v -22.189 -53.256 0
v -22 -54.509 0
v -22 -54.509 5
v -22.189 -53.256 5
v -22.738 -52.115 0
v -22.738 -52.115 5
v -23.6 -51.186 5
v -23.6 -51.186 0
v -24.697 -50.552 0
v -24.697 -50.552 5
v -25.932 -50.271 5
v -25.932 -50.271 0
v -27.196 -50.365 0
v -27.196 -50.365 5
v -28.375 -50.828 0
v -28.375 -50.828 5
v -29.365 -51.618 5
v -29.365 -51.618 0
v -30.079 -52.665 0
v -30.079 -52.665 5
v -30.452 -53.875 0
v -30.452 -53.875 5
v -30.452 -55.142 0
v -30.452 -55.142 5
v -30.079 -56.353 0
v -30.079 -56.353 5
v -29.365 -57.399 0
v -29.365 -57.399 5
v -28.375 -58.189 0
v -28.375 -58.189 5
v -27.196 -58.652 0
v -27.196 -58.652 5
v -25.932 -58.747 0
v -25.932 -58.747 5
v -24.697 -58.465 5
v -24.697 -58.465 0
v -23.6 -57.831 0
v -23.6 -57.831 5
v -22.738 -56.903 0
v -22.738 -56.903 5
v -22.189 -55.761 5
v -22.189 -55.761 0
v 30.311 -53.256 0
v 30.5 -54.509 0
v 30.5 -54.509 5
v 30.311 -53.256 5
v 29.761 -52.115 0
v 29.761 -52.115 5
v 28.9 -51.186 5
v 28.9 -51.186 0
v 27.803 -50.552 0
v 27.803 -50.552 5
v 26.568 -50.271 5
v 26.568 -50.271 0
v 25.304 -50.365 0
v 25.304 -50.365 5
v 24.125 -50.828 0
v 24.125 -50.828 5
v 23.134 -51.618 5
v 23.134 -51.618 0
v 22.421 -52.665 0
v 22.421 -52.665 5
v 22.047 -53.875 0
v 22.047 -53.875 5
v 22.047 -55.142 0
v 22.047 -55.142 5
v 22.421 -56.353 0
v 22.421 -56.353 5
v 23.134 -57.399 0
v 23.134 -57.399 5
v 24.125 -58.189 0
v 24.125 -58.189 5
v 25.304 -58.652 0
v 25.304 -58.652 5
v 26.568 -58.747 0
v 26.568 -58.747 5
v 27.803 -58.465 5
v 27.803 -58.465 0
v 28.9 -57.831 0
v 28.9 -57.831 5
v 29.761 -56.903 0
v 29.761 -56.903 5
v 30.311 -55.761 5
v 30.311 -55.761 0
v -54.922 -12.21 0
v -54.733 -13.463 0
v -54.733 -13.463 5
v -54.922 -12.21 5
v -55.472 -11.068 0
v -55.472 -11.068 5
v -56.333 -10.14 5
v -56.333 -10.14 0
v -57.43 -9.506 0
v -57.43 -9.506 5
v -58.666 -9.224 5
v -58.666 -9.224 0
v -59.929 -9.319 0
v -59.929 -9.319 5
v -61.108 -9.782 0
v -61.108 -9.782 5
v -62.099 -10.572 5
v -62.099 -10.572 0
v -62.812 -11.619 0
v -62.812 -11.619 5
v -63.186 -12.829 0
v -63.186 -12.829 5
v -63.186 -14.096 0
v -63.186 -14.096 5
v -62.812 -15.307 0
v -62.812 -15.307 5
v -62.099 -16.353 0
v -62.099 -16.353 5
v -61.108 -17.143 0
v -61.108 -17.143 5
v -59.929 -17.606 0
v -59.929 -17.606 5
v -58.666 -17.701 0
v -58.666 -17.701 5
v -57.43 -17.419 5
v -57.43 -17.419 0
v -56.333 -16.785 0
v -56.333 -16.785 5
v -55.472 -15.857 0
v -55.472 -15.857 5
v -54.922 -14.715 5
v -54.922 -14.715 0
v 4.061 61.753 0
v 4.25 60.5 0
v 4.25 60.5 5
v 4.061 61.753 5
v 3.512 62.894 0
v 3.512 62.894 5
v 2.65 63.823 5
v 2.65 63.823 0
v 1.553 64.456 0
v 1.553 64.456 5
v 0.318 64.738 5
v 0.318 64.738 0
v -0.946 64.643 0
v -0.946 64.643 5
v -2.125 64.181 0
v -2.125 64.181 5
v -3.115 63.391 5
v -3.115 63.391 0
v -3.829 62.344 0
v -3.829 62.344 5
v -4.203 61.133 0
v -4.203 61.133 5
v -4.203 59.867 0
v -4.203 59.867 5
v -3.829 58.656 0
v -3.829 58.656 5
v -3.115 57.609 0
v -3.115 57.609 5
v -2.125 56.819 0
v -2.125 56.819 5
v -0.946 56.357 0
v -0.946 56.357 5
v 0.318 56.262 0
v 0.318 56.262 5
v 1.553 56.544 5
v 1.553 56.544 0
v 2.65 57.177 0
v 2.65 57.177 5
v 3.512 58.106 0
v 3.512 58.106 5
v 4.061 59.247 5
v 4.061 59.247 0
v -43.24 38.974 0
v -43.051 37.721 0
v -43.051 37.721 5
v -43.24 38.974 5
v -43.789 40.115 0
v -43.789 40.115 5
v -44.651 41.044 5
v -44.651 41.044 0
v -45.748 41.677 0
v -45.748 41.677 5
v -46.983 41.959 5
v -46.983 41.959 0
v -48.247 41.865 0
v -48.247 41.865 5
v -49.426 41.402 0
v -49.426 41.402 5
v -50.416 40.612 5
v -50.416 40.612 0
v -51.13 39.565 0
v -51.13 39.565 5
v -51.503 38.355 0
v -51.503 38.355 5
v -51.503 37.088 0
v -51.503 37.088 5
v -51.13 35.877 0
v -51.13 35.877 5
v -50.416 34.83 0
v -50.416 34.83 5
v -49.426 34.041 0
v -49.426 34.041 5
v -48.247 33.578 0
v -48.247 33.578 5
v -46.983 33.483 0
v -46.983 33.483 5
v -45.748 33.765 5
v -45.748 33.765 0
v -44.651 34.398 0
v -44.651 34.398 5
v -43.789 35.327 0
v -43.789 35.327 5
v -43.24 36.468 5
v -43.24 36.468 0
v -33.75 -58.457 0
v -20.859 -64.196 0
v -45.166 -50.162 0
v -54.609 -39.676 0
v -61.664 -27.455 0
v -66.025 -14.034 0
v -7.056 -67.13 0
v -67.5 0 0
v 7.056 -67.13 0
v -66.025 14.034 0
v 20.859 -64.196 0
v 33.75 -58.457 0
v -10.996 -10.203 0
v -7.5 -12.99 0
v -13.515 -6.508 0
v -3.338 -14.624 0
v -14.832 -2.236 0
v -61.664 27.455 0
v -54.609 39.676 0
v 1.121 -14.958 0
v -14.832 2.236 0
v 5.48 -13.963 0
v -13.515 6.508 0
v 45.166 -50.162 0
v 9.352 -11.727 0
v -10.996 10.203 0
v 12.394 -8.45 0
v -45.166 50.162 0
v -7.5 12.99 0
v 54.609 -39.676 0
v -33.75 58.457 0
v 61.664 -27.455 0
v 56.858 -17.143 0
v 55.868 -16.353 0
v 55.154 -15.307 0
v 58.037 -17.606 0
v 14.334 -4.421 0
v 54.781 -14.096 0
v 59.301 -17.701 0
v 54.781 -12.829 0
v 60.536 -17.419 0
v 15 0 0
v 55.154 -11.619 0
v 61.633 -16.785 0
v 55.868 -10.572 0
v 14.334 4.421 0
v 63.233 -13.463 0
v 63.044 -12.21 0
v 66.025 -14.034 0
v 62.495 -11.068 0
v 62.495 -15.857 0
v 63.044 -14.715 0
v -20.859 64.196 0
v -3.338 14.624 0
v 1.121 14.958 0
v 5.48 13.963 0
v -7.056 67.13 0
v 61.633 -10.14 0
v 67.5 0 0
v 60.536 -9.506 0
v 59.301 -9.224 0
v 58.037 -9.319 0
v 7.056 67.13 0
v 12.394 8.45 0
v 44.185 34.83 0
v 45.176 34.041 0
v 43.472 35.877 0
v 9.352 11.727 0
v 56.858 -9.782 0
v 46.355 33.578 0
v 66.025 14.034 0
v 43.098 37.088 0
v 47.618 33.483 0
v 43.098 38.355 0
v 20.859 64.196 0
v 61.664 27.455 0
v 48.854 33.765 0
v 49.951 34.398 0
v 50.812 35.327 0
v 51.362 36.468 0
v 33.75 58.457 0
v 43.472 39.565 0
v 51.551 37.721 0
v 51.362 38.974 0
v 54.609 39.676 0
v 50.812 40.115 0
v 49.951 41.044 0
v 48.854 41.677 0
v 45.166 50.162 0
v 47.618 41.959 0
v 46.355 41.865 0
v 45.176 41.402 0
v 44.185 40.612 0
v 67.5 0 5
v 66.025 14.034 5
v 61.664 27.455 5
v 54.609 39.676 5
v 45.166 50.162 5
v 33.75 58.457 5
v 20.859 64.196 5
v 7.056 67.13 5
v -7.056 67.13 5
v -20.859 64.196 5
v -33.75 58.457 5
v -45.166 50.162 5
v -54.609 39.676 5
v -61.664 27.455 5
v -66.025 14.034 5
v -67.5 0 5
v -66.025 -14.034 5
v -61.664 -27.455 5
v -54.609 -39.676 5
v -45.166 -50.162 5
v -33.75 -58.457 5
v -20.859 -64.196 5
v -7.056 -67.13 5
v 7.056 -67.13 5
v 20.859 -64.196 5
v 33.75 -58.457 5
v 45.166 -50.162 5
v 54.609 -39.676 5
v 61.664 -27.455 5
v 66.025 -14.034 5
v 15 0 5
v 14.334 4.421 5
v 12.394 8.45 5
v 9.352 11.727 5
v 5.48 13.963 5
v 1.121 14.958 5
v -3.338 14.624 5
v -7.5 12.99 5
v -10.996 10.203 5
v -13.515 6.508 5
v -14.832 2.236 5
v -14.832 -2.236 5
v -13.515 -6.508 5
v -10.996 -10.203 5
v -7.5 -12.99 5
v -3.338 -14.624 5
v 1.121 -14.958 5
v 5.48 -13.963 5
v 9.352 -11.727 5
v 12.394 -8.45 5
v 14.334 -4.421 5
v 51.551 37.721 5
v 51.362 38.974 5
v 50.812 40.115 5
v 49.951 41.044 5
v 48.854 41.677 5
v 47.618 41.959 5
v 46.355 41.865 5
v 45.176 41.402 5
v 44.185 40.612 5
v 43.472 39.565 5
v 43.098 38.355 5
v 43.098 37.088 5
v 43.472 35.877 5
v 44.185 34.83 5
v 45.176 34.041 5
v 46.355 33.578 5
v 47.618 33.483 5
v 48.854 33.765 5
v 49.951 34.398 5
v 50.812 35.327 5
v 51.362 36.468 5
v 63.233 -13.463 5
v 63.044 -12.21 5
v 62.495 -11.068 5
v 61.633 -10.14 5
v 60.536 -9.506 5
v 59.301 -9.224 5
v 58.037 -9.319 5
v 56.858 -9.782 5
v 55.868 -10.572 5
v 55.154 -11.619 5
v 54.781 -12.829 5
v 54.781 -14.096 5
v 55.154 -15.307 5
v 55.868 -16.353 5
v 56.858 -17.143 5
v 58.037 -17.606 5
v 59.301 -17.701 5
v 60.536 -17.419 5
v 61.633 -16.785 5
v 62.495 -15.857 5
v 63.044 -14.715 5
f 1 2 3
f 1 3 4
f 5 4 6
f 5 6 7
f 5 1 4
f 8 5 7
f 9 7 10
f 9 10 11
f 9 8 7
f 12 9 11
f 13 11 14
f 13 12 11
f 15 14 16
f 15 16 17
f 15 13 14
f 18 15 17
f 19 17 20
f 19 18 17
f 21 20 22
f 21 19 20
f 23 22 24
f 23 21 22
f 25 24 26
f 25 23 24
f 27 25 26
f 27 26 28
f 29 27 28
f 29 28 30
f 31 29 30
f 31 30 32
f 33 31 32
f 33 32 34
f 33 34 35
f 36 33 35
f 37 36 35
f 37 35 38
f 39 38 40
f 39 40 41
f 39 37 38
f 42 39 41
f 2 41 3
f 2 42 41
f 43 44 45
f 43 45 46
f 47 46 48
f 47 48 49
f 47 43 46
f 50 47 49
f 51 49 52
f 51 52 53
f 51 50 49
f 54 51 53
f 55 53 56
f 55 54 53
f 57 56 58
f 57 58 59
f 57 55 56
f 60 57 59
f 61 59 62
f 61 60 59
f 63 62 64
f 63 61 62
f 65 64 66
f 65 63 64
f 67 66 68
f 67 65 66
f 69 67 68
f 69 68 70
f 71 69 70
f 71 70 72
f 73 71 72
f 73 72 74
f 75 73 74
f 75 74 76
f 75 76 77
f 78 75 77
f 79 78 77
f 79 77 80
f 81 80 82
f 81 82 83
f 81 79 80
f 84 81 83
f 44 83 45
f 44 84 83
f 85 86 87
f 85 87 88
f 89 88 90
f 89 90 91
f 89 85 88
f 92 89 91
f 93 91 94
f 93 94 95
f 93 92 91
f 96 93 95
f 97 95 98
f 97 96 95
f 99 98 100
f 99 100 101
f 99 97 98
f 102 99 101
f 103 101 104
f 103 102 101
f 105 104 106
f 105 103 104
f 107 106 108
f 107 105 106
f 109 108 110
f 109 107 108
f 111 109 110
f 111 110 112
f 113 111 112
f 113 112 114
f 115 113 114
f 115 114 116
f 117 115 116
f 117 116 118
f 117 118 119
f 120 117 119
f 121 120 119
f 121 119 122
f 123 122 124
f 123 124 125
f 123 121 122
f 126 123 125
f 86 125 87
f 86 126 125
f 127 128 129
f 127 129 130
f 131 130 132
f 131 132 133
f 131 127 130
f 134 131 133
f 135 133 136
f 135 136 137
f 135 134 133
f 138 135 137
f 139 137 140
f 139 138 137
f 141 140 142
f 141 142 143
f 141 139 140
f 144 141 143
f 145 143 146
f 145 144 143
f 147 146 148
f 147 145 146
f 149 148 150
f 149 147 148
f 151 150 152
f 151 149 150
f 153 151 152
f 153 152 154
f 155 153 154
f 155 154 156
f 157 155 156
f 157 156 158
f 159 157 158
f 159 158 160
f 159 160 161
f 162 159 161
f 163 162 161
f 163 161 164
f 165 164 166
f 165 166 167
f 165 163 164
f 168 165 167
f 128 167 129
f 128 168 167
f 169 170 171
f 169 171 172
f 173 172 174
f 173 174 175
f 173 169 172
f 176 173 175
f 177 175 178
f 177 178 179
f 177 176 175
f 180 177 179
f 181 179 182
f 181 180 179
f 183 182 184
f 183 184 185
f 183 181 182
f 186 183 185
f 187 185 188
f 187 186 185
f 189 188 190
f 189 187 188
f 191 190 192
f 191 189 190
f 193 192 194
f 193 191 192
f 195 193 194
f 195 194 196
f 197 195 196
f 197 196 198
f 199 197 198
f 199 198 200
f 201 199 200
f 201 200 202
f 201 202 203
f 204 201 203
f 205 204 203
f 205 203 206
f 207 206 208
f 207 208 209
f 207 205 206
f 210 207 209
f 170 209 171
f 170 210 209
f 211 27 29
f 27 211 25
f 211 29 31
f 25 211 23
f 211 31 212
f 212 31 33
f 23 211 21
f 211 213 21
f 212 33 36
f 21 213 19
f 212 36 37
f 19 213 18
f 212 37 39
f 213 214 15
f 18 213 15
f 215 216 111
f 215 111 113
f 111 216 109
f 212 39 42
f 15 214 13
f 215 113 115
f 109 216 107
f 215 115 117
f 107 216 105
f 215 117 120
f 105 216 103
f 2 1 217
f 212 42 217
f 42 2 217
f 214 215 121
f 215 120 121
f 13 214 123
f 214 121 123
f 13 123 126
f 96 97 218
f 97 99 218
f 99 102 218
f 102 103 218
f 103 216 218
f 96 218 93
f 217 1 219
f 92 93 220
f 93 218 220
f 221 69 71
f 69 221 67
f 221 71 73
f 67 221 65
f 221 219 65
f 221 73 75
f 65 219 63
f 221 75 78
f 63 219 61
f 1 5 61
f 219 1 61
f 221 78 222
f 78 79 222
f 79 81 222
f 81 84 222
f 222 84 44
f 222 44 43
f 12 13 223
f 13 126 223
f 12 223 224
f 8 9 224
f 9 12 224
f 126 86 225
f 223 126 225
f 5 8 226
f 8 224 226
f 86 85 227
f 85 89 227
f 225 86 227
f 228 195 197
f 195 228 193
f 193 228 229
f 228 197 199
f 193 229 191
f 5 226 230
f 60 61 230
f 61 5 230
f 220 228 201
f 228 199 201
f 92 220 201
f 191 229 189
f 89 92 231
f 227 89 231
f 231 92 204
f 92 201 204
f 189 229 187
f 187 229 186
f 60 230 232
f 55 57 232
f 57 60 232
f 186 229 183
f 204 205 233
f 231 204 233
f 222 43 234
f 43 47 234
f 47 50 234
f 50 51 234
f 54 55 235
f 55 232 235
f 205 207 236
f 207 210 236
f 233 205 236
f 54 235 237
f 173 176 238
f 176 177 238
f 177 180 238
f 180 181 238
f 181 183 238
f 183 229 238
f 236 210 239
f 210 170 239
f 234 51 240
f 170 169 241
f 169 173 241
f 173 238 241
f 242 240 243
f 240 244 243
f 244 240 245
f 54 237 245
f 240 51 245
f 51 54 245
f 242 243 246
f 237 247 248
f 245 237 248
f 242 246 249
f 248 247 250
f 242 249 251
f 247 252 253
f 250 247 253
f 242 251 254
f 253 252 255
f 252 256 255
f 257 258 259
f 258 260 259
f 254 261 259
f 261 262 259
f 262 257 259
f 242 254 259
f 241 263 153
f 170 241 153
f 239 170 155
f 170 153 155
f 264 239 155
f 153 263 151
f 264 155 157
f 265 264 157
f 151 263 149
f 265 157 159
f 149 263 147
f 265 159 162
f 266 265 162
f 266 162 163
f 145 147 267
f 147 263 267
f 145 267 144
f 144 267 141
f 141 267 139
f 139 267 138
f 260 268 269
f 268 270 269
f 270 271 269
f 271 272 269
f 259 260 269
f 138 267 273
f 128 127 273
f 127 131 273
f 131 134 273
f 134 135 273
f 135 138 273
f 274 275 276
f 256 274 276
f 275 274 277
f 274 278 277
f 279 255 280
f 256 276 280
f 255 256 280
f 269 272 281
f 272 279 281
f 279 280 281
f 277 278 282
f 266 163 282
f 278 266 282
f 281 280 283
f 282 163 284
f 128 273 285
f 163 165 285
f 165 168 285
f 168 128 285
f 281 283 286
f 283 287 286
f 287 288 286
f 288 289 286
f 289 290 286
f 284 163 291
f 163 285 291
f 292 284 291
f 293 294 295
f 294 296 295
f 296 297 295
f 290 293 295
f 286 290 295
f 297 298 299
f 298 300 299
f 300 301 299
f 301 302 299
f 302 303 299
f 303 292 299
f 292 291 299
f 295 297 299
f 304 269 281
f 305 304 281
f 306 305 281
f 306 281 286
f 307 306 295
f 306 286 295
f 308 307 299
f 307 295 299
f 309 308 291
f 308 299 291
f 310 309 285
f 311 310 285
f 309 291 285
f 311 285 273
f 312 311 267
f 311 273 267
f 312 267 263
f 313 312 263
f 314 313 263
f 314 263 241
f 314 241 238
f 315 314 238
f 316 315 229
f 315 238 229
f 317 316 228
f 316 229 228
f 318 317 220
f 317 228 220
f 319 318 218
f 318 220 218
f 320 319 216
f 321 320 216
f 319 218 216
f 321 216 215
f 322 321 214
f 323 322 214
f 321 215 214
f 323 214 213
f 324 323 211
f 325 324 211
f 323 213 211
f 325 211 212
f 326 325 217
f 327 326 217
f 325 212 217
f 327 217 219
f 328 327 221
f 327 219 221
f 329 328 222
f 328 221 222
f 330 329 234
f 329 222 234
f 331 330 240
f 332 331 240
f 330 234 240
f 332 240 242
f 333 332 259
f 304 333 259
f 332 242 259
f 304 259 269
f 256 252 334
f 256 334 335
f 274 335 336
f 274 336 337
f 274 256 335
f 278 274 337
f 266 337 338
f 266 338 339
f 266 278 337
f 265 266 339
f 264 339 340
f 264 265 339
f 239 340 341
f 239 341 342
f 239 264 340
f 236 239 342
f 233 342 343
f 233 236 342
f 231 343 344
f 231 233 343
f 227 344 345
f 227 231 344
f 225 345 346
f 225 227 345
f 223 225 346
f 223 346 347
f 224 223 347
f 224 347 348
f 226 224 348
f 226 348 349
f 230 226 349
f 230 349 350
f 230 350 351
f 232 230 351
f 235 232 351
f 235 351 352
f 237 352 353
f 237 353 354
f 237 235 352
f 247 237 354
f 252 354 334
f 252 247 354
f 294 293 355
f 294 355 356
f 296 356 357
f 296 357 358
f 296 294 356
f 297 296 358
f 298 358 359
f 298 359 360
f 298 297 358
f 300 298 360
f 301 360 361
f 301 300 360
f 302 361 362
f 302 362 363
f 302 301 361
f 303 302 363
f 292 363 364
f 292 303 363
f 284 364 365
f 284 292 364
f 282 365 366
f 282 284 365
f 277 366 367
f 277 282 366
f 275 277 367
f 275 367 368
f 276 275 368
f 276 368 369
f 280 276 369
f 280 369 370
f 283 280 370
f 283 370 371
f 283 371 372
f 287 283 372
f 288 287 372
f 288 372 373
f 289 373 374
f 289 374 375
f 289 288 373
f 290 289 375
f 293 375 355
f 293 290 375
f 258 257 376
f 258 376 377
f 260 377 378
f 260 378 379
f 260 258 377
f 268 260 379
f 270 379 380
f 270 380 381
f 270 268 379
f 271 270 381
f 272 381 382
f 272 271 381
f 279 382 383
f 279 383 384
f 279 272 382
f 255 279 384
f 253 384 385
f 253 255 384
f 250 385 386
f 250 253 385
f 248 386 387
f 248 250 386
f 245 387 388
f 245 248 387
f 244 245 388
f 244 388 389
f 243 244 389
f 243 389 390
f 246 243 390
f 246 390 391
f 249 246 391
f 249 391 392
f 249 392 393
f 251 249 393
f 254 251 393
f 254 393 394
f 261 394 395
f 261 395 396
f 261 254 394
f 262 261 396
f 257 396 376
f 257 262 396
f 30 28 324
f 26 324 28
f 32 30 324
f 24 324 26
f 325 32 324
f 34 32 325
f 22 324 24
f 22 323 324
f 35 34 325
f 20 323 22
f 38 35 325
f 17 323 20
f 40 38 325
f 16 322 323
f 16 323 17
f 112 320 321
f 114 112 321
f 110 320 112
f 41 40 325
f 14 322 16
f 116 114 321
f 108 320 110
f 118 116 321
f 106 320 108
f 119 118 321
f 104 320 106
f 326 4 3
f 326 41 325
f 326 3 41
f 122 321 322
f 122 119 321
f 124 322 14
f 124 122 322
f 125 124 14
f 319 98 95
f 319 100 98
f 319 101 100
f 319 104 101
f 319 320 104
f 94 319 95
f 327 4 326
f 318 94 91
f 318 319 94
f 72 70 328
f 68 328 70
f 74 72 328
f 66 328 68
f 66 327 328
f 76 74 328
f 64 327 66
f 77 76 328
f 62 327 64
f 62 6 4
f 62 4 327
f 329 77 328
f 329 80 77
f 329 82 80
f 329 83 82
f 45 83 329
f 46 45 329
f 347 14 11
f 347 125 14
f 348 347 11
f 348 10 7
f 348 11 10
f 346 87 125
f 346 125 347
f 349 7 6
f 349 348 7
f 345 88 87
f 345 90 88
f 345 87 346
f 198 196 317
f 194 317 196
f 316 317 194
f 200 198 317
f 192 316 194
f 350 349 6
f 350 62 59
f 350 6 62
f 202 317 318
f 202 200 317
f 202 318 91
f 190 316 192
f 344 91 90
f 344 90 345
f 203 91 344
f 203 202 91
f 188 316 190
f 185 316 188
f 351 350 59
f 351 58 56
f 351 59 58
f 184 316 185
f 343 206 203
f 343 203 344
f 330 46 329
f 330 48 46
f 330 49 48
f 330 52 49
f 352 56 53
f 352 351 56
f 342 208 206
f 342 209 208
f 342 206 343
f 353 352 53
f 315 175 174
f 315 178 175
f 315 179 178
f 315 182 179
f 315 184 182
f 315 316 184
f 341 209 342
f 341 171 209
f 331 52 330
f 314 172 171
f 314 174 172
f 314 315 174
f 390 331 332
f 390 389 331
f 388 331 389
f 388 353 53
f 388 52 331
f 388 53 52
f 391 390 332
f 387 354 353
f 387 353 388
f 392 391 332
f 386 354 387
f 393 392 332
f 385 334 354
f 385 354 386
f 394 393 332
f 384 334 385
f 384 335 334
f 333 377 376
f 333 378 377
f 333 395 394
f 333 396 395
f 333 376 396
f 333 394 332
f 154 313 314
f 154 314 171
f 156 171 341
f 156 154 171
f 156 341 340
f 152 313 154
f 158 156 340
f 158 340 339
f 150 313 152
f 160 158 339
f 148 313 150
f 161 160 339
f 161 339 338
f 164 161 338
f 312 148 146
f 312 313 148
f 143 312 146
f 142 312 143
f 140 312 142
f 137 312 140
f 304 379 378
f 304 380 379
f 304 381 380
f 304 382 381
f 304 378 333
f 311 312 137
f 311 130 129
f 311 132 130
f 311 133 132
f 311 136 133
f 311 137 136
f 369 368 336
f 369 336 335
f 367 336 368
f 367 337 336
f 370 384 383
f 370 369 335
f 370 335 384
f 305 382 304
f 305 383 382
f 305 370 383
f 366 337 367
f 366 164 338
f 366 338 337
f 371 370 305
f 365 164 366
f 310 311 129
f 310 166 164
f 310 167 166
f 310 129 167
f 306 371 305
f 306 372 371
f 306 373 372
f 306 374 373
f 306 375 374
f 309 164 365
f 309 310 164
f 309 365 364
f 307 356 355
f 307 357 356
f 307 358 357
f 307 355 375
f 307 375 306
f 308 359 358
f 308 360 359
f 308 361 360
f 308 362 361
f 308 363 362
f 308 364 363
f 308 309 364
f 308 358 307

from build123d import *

# Parameters (mm, degrees)
ESQUISSE1_R        = 67.5
ESQUISSE1_R_2      = 4.25
ESQUISSE1_R_3      = 15
BOSS_EXTRU_1_DEPTH = 5


with BuildPart() as part:
    # Esquisse1 → Boss.-Extru.1 (new body)
    with BuildSketch(Plane.XY):
        Circle(ESQUISSE1_R)
        with Locations((0, 60.5)):
            Circle(ESQUISSE1_R_2, mode=Mode.SUBTRACT)
        with Locations((47.300804689, 37.721133012)):
            Circle(ESQUISSE1_R_2, mode=Mode.SUBTRACT)
        with Locations((58.983138687, -13.462516504)):
            Circle(ESQUISSE1_R_2, mode=Mode.SUBTRACT)
        with Locations((26.249966217, -54.508616508)):
            Circle(ESQUISSE1_R_2, mode=Mode.SUBTRACT)
        with Locations((-26.249966217, -54.508616508)):
            Circle(ESQUISSE1_R_2, mode=Mode.SUBTRACT)
        with Locations((-58.983138687, -13.462516504)):
            Circle(ESQUISSE1_R_2, mode=Mode.SUBTRACT)
        with Locations((-47.300804689, 37.721133012)):
            Circle(ESQUISSE1_R_2, mode=Mode.SUBTRACT)
        Circle(ESQUISSE1_R_3, mode=Mode.SUBTRACT)
    extrude(amount=BOSS_EXTRU_1_DEPTH)


solid = part.part
